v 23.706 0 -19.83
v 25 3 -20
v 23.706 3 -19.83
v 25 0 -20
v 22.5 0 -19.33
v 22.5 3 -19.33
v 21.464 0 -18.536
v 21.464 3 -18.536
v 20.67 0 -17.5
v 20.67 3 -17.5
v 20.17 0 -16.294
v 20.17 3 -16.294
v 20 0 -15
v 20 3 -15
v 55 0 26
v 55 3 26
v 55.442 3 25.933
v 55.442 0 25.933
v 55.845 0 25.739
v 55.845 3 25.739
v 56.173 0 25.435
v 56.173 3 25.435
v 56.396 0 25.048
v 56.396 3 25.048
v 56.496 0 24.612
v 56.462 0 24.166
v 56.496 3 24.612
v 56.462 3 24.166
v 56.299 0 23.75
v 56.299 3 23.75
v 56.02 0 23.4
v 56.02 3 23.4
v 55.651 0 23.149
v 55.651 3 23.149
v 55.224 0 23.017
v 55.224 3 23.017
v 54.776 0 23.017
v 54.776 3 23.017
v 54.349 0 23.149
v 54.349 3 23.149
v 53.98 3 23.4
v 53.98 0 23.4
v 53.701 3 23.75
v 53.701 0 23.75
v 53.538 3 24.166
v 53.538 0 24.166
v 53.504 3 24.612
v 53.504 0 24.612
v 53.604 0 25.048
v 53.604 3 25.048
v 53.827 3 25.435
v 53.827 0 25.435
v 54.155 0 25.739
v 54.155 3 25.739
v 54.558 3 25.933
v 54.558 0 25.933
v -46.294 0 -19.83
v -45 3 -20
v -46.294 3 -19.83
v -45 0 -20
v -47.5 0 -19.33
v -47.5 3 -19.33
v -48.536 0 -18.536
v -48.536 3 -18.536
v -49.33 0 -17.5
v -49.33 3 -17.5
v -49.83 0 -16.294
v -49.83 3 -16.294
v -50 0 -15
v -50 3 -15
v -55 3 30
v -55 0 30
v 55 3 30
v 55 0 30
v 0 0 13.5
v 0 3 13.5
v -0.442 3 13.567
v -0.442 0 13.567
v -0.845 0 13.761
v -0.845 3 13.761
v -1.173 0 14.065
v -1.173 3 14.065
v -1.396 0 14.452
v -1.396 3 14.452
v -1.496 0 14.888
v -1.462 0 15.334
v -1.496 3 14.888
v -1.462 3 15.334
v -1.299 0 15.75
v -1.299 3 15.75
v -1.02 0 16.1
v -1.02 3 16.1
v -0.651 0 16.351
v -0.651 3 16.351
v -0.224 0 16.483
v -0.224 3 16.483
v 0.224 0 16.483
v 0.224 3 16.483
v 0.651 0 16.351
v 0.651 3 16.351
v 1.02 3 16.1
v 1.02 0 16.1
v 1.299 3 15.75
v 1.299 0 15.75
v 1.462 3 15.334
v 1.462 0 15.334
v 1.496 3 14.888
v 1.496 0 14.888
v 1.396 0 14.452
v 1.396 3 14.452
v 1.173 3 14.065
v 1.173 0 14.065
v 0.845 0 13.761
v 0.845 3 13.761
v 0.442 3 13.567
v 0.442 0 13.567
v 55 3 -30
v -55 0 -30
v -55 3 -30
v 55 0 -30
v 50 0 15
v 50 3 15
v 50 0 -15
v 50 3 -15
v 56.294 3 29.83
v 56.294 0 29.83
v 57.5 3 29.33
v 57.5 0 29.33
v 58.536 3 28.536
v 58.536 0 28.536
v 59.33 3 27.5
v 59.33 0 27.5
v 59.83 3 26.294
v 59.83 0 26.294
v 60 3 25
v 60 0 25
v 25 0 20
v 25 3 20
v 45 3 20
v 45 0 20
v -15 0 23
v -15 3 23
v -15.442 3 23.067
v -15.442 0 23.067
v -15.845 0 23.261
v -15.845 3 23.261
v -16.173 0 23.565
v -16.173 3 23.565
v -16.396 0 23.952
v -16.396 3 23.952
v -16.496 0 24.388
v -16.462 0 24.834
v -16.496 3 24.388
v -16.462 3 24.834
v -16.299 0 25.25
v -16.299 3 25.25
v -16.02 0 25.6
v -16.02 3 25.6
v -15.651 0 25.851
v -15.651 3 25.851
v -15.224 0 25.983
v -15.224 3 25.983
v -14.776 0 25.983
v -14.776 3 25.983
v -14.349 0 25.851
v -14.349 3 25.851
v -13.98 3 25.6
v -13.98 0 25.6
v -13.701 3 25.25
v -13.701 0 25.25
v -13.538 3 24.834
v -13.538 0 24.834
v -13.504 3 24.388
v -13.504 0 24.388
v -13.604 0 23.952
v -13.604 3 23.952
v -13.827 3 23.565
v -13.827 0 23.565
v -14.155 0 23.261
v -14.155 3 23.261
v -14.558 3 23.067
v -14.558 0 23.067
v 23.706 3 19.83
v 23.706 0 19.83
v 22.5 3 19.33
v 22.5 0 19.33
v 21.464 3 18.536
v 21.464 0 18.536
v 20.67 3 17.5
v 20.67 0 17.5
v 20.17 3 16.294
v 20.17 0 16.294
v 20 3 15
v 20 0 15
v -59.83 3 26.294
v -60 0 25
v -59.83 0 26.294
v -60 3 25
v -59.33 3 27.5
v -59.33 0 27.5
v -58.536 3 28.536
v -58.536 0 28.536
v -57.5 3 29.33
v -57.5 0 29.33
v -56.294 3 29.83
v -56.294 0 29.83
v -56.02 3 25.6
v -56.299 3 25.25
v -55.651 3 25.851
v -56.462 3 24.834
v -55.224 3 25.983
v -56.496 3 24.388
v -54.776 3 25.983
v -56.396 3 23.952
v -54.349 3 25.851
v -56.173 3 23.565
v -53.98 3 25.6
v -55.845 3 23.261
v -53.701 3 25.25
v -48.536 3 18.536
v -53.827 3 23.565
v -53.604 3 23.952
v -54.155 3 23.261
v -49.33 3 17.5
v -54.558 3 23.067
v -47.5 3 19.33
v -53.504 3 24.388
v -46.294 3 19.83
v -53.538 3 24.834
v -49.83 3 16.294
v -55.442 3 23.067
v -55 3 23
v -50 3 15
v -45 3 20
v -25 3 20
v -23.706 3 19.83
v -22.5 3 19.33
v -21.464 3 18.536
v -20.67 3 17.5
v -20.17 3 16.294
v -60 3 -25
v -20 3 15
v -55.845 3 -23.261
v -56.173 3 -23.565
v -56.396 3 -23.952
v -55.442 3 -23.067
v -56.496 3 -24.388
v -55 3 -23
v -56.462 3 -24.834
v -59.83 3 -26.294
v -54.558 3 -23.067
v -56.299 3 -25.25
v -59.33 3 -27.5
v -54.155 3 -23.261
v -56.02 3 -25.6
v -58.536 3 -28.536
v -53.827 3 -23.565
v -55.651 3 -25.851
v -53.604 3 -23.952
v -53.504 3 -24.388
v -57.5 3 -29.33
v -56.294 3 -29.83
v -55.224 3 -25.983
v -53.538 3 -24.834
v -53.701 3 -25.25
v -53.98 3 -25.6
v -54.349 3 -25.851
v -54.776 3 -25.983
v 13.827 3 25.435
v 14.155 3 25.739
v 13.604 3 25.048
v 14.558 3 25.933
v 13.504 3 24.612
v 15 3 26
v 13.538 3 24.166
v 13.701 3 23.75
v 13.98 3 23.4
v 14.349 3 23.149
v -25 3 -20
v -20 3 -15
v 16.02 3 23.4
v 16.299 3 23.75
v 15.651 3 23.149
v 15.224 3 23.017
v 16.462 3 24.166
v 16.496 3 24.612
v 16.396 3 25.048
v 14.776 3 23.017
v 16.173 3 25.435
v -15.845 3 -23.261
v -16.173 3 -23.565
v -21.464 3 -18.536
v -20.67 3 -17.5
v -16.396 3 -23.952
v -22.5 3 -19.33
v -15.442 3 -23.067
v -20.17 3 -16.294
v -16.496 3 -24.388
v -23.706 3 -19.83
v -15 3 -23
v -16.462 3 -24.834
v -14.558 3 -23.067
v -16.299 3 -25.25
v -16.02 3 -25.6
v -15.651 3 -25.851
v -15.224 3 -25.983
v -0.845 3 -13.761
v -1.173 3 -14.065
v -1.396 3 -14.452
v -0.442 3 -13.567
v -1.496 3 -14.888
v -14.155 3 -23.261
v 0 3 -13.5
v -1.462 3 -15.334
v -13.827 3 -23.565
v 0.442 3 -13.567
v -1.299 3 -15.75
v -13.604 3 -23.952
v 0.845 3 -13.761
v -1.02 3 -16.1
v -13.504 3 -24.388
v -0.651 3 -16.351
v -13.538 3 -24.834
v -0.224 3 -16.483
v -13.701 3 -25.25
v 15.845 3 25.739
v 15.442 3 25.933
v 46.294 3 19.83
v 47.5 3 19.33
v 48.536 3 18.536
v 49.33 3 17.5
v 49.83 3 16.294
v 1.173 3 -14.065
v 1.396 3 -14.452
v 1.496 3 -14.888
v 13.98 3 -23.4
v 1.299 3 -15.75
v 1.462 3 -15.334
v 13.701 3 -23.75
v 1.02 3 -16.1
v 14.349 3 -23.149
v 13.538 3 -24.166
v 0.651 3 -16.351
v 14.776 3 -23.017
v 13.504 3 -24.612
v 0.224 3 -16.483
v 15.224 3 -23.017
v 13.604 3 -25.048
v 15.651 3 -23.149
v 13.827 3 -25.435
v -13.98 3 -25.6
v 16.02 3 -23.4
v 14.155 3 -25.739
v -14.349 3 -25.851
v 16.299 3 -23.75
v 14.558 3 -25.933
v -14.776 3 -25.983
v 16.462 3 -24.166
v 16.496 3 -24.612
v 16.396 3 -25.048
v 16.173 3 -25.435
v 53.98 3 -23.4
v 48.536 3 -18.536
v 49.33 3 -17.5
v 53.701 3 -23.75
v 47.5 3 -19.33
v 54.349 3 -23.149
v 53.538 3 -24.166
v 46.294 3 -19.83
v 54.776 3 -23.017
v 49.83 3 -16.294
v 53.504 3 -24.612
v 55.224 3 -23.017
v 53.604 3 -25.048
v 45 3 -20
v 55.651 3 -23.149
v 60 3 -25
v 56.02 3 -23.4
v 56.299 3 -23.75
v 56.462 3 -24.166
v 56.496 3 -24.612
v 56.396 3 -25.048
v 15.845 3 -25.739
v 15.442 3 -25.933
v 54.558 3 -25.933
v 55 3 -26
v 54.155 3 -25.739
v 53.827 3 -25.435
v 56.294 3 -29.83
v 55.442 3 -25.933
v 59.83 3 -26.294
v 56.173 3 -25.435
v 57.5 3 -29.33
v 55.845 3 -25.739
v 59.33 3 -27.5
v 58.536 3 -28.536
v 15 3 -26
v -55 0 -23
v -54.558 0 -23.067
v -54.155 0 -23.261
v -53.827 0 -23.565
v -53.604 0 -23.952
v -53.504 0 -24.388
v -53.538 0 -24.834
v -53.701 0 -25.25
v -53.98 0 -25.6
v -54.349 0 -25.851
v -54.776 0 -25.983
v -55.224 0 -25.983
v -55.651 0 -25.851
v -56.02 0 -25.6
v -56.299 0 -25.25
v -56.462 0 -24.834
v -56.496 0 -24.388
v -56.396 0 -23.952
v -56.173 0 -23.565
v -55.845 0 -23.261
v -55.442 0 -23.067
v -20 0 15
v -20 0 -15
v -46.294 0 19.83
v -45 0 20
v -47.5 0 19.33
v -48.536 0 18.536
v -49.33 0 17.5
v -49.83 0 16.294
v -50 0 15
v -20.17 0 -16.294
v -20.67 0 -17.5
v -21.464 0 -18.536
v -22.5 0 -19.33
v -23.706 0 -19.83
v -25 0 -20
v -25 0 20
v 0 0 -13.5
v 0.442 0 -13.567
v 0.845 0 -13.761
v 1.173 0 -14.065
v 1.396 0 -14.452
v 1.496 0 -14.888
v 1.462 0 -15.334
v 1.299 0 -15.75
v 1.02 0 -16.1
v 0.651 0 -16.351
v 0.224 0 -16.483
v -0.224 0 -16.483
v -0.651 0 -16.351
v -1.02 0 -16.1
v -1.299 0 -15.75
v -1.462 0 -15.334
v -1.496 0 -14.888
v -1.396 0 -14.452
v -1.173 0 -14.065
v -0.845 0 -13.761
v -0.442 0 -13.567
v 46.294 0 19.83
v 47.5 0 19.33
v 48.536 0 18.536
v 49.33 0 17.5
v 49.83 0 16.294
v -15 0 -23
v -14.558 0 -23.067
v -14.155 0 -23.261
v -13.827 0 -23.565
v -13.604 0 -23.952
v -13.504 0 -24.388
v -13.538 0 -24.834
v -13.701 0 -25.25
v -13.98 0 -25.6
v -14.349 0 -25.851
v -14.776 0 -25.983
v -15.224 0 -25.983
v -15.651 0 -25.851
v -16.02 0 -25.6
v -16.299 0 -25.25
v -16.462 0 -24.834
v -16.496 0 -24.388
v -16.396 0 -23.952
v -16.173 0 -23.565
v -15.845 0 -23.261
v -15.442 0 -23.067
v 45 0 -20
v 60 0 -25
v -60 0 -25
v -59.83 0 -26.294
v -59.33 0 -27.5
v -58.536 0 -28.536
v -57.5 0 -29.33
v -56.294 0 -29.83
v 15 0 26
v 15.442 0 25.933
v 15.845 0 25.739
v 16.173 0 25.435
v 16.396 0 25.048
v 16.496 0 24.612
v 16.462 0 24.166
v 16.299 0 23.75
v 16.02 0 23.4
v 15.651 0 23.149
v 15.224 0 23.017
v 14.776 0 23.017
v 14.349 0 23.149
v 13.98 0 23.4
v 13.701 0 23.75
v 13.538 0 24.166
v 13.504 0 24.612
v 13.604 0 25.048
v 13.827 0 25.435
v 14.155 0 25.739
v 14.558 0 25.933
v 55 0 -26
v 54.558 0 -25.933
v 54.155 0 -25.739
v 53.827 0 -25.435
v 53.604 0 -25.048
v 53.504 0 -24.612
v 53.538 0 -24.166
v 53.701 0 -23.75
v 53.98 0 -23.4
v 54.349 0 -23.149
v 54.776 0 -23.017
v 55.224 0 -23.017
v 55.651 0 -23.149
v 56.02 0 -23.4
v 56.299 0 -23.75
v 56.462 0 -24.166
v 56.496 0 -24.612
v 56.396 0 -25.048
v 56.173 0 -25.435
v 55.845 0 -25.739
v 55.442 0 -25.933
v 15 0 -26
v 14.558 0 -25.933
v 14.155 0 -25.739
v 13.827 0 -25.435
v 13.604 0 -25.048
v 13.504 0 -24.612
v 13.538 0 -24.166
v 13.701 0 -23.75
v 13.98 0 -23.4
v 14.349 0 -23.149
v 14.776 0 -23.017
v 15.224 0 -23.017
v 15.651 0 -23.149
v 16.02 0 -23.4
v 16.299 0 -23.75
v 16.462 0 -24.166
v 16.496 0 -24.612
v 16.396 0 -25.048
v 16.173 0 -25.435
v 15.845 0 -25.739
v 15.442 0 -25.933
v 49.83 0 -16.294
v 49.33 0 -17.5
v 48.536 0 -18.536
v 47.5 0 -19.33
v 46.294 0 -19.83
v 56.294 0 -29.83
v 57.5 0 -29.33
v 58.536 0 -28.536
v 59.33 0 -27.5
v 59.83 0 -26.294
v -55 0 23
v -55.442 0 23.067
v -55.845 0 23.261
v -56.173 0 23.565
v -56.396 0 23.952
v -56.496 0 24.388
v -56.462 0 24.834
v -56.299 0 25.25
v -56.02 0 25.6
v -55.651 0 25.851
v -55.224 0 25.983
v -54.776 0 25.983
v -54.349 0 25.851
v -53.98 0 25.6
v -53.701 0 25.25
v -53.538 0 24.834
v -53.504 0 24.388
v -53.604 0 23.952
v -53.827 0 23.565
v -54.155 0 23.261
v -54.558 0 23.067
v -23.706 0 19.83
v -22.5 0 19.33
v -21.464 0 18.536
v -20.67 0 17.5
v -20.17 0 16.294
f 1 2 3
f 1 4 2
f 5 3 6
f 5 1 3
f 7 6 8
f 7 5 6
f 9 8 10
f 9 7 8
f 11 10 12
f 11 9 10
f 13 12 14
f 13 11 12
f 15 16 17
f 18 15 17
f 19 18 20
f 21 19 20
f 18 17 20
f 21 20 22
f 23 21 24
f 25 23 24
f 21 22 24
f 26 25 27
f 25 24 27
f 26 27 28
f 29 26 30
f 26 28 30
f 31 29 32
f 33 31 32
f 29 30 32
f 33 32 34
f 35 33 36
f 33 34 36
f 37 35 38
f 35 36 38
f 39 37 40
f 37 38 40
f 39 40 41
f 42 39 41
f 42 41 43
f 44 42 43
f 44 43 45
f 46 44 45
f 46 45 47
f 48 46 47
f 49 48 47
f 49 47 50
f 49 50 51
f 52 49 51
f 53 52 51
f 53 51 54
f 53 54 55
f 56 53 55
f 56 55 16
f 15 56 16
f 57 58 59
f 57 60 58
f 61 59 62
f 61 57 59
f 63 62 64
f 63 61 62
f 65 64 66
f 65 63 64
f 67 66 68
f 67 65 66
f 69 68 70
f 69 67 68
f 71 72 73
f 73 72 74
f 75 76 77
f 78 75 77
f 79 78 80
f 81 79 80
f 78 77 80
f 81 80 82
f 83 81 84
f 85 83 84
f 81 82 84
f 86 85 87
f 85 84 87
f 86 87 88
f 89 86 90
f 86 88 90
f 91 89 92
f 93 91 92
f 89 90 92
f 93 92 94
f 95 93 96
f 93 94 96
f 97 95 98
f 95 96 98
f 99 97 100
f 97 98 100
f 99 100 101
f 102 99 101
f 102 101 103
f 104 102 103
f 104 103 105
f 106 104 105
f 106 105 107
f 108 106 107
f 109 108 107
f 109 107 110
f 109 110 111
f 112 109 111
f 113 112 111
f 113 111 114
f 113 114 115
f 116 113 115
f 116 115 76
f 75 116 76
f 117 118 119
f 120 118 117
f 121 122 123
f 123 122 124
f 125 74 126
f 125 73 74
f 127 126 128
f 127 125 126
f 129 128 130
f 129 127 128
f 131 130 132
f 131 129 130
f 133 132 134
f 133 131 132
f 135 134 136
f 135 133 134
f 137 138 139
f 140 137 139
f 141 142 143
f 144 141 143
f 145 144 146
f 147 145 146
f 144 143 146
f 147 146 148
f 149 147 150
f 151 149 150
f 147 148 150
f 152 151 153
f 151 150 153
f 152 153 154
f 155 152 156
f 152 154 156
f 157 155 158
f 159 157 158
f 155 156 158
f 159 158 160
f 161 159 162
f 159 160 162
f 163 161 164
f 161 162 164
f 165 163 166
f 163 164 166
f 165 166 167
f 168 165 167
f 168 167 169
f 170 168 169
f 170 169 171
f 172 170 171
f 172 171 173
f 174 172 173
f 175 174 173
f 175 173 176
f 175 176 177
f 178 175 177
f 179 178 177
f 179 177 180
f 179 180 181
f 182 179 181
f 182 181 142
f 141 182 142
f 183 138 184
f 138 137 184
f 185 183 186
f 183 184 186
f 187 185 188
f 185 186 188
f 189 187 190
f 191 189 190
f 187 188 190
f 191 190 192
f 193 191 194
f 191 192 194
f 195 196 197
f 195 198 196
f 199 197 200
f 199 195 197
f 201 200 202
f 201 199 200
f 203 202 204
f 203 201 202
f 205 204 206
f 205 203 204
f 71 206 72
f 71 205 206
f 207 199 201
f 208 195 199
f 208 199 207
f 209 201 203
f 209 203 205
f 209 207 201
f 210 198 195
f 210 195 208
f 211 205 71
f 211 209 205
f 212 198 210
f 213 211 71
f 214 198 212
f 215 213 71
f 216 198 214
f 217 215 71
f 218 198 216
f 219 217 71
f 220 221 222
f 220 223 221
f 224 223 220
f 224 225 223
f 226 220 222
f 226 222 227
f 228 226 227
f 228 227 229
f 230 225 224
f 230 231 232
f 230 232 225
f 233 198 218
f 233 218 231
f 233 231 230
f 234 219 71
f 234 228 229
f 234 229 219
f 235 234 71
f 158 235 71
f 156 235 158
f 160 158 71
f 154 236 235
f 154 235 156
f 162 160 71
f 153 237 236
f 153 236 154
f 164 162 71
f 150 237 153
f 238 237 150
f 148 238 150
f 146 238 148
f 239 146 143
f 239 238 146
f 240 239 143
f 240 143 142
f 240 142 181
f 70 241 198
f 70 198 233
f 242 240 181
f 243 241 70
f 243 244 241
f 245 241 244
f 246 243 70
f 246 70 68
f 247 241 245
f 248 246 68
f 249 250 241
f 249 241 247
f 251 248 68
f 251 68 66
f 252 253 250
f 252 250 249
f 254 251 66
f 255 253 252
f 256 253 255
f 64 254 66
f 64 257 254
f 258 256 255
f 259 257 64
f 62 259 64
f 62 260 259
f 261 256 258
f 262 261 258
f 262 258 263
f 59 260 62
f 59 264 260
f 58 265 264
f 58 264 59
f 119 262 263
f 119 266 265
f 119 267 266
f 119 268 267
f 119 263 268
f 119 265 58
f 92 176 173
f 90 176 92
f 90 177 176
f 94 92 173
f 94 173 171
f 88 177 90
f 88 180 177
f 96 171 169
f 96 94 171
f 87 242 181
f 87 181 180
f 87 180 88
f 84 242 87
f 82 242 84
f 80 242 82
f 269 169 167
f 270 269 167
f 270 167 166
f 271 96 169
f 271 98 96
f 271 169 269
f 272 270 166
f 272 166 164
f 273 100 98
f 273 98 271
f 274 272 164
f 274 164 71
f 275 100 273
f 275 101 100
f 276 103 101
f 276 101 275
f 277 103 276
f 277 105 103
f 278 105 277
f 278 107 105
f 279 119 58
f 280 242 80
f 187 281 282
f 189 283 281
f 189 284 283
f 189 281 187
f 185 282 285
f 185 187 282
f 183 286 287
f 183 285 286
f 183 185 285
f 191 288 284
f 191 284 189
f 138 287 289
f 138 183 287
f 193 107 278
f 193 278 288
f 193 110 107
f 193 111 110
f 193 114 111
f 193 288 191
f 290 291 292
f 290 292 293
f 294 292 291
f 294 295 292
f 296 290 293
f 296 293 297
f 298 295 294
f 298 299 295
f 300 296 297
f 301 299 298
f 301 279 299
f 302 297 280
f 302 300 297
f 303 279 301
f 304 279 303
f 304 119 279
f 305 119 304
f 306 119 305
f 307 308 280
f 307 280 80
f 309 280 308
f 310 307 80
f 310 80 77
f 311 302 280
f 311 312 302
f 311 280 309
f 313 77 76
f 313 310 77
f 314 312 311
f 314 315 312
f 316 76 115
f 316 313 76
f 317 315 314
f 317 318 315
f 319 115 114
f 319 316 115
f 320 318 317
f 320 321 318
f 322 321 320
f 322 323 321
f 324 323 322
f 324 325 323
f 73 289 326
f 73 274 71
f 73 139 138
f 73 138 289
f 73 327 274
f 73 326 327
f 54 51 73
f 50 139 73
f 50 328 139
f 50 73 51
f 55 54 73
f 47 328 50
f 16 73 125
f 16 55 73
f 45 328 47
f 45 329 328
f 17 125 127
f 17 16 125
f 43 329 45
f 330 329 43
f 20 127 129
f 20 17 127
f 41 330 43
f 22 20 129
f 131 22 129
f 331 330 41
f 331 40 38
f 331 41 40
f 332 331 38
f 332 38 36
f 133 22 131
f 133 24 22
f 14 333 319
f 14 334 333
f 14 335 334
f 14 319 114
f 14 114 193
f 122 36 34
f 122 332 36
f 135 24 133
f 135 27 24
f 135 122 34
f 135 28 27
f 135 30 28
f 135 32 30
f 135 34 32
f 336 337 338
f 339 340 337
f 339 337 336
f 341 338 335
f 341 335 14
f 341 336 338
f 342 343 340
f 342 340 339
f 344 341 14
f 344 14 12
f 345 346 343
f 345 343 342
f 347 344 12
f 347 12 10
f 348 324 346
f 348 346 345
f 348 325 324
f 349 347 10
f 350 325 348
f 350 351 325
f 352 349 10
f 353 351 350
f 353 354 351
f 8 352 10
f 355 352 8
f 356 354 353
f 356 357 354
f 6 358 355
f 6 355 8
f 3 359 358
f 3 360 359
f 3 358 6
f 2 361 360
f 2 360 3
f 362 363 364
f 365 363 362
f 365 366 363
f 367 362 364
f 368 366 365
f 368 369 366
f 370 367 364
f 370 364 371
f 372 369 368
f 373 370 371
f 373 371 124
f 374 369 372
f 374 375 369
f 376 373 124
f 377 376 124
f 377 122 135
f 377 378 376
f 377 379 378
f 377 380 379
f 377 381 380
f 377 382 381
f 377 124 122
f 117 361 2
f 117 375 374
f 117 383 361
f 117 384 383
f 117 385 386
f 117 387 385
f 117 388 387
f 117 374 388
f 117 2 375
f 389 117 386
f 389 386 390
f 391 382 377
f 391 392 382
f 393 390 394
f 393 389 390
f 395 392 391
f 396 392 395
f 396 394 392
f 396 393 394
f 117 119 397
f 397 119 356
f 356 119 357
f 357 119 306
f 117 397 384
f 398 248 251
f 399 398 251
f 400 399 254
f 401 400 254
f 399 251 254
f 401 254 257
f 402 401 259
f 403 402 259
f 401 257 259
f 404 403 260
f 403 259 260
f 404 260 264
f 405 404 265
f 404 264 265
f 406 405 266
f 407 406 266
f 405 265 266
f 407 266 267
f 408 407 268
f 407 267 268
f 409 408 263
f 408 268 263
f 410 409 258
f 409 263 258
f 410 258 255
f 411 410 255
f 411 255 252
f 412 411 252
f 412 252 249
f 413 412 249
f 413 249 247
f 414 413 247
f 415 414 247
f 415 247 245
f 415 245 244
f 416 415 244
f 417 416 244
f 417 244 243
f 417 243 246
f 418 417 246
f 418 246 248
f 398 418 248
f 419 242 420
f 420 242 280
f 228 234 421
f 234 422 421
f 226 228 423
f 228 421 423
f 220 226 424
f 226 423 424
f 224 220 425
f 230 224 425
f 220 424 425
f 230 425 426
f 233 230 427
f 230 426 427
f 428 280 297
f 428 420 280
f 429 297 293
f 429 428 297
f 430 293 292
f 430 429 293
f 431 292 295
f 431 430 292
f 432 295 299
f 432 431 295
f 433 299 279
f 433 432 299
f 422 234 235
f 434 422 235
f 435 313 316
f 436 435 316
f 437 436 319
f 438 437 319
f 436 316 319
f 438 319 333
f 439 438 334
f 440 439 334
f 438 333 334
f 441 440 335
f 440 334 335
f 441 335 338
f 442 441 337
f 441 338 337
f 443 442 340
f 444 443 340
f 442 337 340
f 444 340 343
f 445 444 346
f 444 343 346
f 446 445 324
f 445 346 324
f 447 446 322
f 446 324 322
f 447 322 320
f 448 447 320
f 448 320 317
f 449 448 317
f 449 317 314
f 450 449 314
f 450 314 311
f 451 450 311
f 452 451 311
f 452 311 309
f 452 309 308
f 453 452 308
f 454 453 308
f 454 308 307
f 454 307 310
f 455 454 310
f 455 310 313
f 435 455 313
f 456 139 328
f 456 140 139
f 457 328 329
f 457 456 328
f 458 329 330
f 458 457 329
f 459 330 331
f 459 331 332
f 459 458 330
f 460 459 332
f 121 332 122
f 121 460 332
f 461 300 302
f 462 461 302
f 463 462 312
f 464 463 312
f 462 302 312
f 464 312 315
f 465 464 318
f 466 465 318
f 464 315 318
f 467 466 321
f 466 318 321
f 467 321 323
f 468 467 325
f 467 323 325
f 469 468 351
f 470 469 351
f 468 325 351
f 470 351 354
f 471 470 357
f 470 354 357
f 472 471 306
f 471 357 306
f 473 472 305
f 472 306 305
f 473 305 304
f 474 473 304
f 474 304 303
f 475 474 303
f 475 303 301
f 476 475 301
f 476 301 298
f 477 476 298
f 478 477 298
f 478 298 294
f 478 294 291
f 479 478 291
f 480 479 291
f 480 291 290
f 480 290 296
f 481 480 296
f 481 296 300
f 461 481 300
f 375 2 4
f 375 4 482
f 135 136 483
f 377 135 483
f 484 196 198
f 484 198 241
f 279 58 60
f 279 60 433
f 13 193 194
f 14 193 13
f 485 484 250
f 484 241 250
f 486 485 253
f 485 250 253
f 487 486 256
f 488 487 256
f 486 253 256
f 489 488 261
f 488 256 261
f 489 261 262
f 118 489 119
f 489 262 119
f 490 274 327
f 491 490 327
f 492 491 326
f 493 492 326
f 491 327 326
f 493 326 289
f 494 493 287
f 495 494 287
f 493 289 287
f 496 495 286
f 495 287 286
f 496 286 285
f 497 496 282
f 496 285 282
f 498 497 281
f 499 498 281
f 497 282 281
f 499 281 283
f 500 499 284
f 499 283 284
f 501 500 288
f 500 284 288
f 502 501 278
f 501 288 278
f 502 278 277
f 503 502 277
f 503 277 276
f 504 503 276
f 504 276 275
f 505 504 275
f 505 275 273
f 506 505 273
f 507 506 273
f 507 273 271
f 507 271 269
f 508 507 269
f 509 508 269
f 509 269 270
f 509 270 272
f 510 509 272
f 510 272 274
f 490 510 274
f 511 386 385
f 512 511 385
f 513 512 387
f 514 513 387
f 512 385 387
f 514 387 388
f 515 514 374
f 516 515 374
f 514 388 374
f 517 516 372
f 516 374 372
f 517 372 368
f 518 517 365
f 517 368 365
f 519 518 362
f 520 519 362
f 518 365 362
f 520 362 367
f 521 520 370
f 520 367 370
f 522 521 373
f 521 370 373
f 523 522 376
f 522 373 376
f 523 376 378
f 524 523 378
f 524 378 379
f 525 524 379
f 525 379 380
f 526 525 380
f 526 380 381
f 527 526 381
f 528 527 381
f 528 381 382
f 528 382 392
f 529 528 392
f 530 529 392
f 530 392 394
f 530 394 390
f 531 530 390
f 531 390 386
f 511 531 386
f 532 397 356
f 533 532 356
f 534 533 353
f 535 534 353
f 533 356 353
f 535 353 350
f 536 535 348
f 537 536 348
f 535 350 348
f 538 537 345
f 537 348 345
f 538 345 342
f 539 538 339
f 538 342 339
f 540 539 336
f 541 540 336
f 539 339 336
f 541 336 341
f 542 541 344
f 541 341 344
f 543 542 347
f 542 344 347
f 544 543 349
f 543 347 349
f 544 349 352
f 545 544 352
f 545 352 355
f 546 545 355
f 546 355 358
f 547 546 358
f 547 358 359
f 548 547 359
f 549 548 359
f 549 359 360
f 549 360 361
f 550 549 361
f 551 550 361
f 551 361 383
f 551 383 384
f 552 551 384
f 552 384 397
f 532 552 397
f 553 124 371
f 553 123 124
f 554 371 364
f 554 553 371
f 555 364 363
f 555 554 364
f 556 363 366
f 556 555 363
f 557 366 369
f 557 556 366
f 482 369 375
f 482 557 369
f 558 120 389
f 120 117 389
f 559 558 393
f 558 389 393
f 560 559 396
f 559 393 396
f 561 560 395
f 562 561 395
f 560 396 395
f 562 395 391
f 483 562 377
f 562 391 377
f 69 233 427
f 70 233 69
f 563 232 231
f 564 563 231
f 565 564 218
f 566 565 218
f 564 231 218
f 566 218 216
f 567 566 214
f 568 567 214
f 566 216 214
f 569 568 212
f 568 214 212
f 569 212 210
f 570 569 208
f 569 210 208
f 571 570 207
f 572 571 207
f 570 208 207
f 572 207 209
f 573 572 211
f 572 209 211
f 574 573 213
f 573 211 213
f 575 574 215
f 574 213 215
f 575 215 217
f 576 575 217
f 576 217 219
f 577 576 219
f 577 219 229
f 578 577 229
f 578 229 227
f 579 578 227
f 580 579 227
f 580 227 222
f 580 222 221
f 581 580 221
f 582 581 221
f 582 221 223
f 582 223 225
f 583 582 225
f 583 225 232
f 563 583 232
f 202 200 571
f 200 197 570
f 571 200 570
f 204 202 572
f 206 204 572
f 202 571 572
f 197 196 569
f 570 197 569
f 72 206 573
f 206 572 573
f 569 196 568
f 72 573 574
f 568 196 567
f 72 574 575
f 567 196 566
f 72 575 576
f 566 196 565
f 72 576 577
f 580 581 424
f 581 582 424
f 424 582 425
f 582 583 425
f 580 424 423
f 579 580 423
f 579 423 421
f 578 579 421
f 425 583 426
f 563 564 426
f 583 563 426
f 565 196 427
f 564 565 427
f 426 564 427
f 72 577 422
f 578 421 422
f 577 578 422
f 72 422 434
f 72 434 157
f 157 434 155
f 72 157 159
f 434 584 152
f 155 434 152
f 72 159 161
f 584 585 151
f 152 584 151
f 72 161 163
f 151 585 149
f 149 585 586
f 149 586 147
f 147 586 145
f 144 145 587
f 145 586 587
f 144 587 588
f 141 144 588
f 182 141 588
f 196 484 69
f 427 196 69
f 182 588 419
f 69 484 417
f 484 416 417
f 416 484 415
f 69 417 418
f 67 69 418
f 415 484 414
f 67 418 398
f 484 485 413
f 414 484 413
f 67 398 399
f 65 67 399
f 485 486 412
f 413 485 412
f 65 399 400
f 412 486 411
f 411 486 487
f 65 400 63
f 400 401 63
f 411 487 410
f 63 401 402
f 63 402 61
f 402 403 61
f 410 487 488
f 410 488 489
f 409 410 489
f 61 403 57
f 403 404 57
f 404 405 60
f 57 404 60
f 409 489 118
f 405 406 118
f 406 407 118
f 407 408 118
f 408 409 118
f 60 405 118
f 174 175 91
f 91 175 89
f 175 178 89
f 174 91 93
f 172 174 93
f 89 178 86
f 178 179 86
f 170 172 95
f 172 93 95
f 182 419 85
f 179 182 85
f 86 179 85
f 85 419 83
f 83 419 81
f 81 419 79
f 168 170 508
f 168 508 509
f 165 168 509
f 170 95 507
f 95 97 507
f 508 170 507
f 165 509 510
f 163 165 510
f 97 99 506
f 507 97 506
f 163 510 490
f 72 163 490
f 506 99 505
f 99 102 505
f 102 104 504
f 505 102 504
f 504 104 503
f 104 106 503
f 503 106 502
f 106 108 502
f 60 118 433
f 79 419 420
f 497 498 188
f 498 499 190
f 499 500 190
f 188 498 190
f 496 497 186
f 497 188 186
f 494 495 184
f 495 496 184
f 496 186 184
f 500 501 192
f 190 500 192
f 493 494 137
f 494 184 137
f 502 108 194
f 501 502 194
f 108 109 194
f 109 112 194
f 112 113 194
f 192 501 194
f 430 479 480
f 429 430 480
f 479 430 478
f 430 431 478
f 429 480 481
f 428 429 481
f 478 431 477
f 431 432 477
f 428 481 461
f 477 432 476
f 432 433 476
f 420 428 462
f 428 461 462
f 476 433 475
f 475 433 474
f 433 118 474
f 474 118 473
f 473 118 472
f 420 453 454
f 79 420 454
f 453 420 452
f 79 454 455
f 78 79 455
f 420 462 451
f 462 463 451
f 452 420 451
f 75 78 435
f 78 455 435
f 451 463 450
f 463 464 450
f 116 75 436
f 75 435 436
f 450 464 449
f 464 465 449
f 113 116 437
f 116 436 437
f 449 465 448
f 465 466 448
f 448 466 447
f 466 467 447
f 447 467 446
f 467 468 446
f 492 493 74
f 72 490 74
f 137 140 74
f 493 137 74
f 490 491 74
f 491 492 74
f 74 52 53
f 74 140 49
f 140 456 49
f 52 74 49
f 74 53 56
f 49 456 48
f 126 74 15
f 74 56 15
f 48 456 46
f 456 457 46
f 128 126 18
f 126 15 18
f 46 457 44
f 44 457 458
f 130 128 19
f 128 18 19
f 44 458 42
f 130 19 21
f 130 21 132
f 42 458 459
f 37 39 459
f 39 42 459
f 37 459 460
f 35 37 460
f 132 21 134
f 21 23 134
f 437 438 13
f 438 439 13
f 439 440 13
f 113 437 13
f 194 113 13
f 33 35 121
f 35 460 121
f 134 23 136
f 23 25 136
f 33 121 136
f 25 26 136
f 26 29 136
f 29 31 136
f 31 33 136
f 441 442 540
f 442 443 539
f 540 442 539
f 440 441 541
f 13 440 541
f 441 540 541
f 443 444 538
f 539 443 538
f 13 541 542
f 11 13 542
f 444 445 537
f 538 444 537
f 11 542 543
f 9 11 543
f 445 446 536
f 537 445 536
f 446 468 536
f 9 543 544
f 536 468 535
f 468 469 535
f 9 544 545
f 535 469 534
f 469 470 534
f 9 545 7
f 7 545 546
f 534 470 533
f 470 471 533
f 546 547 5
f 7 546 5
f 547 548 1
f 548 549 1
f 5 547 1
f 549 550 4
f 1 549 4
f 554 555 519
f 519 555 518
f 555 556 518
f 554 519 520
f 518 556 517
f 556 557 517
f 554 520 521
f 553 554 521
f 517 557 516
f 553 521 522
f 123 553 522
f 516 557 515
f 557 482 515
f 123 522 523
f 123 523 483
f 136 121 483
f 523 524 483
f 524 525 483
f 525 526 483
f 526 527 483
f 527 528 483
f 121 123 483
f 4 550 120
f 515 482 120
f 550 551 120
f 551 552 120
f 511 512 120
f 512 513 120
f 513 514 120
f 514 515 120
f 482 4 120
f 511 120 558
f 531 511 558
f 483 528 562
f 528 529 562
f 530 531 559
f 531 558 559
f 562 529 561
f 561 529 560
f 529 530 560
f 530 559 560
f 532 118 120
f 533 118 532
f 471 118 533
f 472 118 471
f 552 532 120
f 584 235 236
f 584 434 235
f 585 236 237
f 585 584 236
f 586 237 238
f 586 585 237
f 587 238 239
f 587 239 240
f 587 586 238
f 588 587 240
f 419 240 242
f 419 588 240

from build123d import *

# Parameters (mm, degrees)
SKETCH_1_W          = 120
SKETCH_1_H          = 60
EXTRUDE_1_DEPTH     = 3
SKETCH_2_R          = 1.5
CUT_EXTRUDE_1_DEPTH = 68.149087857
SKETCH_3_R          = 1.5
CUT_EXTRUDE_2_DEPTH = 68.149087857
FILLET_1_R          = 5
SKETCH_4_W          = 30
SKETCH_4_H          = 40
CUT_EXTRUDE_3_DEPTH = 68.149087857
FILLET_2_R          = 5


with BuildPart() as part:
    # 草图1 → 凸台-拉伸1 (new body)
    with BuildSketch(Plane(origin=(0, 0, 0), x_dir=(1, 0, 0), z_dir=(0, 1, 0))):
        Rectangle(SKETCH_1_W, SKETCH_1_H)
    extrude(amount=EXTRUDE_1_DEPTH)

    # 草图2 → 切除-拉伸1 (cut, through all)
    with BuildSketch(Plane(origin=(0, 3, 0), x_dir=(1, 0, 0), z_dir=(0, 1, 0))):
        with Locations((-55, 24.5)):
            Circle(SKETCH_2_R)
        with Locations((-15, 24.5)):
            Circle(SKETCH_2_R)
        with Locations((-55, -24.5)):
            Circle(SKETCH_2_R)
        with Locations((-15, -24.5)):
            Circle(SKETCH_2_R)
        with Locations((15, -24.5)):
            Circle(SKETCH_2_R)
        with Locations((55, -24.5)):
            Circle(SKETCH_2_R)
        with Locations((15, 24.5)):
            Circle(SKETCH_2_R)
        with Locations((55, 24.5)):
            Circle(SKETCH_2_R)
    extrude(amount=-CUT_EXTRUDE_1_DEPTH, mode=Mode.SUBTRACT)

    # 草图3 → 切除-拉伸2 (cut, through all)
    with BuildSketch(Plane(origin=(0, 3, 0), x_dir=(1, 0, 0), z_dir=(0, 1, 0))):
        with Locations((0, 15)):
            Circle(SKETCH_3_R)
        with Locations((0, -15)):
            Circle(SKETCH_3_R)
    extrude(amount=-CUT_EXTRUDE_2_DEPTH, mode=Mode.SUBTRACT)

    # 圆角1
    fillet_1_edges = [part.edges().sort_by_distance(p)[0] for p in [
        (-60, 1.5, 30),
        (60, 1.5, 30),
        (60, 1.5, -30),
        (-60, 1.5, -30),
    ]]
    fillet(fillet_1_edges, radius=FILLET_1_R)

    # 草图4 → 切除-拉伸3 (cut, through all)
    with BuildSketch(Plane(origin=(0, 3, 0), x_dir=(1, 0, 0), z_dir=(0, 1, 0))):
        with Locations((35, 0)):
            Rectangle(SKETCH_4_W, SKETCH_4_H)
        with Locations((-35, 0)):
            Rectangle(SKETCH_4_W, SKETCH_4_H)
    extrude(amount=-CUT_EXTRUDE_3_DEPTH, mode=Mode.SUBTRACT)

    # 圆角2
    fillet_2_edges = [part.edges().sort_by_distance(p)[0] for p in [
        (50, 1.5, 20),
        (50, 1.5, -20),
        (20, 1.5, -20),
        (20, 1.5, 20),
        (-50, 1.5, 20),
        (-20, 1.5, 20),
        (-20, 1.5, -20),
        (-50, 1.5, -20),
    ]]
    fillet(fillet_2_edges, radius=FILLET_2_R)


solid = part.part
